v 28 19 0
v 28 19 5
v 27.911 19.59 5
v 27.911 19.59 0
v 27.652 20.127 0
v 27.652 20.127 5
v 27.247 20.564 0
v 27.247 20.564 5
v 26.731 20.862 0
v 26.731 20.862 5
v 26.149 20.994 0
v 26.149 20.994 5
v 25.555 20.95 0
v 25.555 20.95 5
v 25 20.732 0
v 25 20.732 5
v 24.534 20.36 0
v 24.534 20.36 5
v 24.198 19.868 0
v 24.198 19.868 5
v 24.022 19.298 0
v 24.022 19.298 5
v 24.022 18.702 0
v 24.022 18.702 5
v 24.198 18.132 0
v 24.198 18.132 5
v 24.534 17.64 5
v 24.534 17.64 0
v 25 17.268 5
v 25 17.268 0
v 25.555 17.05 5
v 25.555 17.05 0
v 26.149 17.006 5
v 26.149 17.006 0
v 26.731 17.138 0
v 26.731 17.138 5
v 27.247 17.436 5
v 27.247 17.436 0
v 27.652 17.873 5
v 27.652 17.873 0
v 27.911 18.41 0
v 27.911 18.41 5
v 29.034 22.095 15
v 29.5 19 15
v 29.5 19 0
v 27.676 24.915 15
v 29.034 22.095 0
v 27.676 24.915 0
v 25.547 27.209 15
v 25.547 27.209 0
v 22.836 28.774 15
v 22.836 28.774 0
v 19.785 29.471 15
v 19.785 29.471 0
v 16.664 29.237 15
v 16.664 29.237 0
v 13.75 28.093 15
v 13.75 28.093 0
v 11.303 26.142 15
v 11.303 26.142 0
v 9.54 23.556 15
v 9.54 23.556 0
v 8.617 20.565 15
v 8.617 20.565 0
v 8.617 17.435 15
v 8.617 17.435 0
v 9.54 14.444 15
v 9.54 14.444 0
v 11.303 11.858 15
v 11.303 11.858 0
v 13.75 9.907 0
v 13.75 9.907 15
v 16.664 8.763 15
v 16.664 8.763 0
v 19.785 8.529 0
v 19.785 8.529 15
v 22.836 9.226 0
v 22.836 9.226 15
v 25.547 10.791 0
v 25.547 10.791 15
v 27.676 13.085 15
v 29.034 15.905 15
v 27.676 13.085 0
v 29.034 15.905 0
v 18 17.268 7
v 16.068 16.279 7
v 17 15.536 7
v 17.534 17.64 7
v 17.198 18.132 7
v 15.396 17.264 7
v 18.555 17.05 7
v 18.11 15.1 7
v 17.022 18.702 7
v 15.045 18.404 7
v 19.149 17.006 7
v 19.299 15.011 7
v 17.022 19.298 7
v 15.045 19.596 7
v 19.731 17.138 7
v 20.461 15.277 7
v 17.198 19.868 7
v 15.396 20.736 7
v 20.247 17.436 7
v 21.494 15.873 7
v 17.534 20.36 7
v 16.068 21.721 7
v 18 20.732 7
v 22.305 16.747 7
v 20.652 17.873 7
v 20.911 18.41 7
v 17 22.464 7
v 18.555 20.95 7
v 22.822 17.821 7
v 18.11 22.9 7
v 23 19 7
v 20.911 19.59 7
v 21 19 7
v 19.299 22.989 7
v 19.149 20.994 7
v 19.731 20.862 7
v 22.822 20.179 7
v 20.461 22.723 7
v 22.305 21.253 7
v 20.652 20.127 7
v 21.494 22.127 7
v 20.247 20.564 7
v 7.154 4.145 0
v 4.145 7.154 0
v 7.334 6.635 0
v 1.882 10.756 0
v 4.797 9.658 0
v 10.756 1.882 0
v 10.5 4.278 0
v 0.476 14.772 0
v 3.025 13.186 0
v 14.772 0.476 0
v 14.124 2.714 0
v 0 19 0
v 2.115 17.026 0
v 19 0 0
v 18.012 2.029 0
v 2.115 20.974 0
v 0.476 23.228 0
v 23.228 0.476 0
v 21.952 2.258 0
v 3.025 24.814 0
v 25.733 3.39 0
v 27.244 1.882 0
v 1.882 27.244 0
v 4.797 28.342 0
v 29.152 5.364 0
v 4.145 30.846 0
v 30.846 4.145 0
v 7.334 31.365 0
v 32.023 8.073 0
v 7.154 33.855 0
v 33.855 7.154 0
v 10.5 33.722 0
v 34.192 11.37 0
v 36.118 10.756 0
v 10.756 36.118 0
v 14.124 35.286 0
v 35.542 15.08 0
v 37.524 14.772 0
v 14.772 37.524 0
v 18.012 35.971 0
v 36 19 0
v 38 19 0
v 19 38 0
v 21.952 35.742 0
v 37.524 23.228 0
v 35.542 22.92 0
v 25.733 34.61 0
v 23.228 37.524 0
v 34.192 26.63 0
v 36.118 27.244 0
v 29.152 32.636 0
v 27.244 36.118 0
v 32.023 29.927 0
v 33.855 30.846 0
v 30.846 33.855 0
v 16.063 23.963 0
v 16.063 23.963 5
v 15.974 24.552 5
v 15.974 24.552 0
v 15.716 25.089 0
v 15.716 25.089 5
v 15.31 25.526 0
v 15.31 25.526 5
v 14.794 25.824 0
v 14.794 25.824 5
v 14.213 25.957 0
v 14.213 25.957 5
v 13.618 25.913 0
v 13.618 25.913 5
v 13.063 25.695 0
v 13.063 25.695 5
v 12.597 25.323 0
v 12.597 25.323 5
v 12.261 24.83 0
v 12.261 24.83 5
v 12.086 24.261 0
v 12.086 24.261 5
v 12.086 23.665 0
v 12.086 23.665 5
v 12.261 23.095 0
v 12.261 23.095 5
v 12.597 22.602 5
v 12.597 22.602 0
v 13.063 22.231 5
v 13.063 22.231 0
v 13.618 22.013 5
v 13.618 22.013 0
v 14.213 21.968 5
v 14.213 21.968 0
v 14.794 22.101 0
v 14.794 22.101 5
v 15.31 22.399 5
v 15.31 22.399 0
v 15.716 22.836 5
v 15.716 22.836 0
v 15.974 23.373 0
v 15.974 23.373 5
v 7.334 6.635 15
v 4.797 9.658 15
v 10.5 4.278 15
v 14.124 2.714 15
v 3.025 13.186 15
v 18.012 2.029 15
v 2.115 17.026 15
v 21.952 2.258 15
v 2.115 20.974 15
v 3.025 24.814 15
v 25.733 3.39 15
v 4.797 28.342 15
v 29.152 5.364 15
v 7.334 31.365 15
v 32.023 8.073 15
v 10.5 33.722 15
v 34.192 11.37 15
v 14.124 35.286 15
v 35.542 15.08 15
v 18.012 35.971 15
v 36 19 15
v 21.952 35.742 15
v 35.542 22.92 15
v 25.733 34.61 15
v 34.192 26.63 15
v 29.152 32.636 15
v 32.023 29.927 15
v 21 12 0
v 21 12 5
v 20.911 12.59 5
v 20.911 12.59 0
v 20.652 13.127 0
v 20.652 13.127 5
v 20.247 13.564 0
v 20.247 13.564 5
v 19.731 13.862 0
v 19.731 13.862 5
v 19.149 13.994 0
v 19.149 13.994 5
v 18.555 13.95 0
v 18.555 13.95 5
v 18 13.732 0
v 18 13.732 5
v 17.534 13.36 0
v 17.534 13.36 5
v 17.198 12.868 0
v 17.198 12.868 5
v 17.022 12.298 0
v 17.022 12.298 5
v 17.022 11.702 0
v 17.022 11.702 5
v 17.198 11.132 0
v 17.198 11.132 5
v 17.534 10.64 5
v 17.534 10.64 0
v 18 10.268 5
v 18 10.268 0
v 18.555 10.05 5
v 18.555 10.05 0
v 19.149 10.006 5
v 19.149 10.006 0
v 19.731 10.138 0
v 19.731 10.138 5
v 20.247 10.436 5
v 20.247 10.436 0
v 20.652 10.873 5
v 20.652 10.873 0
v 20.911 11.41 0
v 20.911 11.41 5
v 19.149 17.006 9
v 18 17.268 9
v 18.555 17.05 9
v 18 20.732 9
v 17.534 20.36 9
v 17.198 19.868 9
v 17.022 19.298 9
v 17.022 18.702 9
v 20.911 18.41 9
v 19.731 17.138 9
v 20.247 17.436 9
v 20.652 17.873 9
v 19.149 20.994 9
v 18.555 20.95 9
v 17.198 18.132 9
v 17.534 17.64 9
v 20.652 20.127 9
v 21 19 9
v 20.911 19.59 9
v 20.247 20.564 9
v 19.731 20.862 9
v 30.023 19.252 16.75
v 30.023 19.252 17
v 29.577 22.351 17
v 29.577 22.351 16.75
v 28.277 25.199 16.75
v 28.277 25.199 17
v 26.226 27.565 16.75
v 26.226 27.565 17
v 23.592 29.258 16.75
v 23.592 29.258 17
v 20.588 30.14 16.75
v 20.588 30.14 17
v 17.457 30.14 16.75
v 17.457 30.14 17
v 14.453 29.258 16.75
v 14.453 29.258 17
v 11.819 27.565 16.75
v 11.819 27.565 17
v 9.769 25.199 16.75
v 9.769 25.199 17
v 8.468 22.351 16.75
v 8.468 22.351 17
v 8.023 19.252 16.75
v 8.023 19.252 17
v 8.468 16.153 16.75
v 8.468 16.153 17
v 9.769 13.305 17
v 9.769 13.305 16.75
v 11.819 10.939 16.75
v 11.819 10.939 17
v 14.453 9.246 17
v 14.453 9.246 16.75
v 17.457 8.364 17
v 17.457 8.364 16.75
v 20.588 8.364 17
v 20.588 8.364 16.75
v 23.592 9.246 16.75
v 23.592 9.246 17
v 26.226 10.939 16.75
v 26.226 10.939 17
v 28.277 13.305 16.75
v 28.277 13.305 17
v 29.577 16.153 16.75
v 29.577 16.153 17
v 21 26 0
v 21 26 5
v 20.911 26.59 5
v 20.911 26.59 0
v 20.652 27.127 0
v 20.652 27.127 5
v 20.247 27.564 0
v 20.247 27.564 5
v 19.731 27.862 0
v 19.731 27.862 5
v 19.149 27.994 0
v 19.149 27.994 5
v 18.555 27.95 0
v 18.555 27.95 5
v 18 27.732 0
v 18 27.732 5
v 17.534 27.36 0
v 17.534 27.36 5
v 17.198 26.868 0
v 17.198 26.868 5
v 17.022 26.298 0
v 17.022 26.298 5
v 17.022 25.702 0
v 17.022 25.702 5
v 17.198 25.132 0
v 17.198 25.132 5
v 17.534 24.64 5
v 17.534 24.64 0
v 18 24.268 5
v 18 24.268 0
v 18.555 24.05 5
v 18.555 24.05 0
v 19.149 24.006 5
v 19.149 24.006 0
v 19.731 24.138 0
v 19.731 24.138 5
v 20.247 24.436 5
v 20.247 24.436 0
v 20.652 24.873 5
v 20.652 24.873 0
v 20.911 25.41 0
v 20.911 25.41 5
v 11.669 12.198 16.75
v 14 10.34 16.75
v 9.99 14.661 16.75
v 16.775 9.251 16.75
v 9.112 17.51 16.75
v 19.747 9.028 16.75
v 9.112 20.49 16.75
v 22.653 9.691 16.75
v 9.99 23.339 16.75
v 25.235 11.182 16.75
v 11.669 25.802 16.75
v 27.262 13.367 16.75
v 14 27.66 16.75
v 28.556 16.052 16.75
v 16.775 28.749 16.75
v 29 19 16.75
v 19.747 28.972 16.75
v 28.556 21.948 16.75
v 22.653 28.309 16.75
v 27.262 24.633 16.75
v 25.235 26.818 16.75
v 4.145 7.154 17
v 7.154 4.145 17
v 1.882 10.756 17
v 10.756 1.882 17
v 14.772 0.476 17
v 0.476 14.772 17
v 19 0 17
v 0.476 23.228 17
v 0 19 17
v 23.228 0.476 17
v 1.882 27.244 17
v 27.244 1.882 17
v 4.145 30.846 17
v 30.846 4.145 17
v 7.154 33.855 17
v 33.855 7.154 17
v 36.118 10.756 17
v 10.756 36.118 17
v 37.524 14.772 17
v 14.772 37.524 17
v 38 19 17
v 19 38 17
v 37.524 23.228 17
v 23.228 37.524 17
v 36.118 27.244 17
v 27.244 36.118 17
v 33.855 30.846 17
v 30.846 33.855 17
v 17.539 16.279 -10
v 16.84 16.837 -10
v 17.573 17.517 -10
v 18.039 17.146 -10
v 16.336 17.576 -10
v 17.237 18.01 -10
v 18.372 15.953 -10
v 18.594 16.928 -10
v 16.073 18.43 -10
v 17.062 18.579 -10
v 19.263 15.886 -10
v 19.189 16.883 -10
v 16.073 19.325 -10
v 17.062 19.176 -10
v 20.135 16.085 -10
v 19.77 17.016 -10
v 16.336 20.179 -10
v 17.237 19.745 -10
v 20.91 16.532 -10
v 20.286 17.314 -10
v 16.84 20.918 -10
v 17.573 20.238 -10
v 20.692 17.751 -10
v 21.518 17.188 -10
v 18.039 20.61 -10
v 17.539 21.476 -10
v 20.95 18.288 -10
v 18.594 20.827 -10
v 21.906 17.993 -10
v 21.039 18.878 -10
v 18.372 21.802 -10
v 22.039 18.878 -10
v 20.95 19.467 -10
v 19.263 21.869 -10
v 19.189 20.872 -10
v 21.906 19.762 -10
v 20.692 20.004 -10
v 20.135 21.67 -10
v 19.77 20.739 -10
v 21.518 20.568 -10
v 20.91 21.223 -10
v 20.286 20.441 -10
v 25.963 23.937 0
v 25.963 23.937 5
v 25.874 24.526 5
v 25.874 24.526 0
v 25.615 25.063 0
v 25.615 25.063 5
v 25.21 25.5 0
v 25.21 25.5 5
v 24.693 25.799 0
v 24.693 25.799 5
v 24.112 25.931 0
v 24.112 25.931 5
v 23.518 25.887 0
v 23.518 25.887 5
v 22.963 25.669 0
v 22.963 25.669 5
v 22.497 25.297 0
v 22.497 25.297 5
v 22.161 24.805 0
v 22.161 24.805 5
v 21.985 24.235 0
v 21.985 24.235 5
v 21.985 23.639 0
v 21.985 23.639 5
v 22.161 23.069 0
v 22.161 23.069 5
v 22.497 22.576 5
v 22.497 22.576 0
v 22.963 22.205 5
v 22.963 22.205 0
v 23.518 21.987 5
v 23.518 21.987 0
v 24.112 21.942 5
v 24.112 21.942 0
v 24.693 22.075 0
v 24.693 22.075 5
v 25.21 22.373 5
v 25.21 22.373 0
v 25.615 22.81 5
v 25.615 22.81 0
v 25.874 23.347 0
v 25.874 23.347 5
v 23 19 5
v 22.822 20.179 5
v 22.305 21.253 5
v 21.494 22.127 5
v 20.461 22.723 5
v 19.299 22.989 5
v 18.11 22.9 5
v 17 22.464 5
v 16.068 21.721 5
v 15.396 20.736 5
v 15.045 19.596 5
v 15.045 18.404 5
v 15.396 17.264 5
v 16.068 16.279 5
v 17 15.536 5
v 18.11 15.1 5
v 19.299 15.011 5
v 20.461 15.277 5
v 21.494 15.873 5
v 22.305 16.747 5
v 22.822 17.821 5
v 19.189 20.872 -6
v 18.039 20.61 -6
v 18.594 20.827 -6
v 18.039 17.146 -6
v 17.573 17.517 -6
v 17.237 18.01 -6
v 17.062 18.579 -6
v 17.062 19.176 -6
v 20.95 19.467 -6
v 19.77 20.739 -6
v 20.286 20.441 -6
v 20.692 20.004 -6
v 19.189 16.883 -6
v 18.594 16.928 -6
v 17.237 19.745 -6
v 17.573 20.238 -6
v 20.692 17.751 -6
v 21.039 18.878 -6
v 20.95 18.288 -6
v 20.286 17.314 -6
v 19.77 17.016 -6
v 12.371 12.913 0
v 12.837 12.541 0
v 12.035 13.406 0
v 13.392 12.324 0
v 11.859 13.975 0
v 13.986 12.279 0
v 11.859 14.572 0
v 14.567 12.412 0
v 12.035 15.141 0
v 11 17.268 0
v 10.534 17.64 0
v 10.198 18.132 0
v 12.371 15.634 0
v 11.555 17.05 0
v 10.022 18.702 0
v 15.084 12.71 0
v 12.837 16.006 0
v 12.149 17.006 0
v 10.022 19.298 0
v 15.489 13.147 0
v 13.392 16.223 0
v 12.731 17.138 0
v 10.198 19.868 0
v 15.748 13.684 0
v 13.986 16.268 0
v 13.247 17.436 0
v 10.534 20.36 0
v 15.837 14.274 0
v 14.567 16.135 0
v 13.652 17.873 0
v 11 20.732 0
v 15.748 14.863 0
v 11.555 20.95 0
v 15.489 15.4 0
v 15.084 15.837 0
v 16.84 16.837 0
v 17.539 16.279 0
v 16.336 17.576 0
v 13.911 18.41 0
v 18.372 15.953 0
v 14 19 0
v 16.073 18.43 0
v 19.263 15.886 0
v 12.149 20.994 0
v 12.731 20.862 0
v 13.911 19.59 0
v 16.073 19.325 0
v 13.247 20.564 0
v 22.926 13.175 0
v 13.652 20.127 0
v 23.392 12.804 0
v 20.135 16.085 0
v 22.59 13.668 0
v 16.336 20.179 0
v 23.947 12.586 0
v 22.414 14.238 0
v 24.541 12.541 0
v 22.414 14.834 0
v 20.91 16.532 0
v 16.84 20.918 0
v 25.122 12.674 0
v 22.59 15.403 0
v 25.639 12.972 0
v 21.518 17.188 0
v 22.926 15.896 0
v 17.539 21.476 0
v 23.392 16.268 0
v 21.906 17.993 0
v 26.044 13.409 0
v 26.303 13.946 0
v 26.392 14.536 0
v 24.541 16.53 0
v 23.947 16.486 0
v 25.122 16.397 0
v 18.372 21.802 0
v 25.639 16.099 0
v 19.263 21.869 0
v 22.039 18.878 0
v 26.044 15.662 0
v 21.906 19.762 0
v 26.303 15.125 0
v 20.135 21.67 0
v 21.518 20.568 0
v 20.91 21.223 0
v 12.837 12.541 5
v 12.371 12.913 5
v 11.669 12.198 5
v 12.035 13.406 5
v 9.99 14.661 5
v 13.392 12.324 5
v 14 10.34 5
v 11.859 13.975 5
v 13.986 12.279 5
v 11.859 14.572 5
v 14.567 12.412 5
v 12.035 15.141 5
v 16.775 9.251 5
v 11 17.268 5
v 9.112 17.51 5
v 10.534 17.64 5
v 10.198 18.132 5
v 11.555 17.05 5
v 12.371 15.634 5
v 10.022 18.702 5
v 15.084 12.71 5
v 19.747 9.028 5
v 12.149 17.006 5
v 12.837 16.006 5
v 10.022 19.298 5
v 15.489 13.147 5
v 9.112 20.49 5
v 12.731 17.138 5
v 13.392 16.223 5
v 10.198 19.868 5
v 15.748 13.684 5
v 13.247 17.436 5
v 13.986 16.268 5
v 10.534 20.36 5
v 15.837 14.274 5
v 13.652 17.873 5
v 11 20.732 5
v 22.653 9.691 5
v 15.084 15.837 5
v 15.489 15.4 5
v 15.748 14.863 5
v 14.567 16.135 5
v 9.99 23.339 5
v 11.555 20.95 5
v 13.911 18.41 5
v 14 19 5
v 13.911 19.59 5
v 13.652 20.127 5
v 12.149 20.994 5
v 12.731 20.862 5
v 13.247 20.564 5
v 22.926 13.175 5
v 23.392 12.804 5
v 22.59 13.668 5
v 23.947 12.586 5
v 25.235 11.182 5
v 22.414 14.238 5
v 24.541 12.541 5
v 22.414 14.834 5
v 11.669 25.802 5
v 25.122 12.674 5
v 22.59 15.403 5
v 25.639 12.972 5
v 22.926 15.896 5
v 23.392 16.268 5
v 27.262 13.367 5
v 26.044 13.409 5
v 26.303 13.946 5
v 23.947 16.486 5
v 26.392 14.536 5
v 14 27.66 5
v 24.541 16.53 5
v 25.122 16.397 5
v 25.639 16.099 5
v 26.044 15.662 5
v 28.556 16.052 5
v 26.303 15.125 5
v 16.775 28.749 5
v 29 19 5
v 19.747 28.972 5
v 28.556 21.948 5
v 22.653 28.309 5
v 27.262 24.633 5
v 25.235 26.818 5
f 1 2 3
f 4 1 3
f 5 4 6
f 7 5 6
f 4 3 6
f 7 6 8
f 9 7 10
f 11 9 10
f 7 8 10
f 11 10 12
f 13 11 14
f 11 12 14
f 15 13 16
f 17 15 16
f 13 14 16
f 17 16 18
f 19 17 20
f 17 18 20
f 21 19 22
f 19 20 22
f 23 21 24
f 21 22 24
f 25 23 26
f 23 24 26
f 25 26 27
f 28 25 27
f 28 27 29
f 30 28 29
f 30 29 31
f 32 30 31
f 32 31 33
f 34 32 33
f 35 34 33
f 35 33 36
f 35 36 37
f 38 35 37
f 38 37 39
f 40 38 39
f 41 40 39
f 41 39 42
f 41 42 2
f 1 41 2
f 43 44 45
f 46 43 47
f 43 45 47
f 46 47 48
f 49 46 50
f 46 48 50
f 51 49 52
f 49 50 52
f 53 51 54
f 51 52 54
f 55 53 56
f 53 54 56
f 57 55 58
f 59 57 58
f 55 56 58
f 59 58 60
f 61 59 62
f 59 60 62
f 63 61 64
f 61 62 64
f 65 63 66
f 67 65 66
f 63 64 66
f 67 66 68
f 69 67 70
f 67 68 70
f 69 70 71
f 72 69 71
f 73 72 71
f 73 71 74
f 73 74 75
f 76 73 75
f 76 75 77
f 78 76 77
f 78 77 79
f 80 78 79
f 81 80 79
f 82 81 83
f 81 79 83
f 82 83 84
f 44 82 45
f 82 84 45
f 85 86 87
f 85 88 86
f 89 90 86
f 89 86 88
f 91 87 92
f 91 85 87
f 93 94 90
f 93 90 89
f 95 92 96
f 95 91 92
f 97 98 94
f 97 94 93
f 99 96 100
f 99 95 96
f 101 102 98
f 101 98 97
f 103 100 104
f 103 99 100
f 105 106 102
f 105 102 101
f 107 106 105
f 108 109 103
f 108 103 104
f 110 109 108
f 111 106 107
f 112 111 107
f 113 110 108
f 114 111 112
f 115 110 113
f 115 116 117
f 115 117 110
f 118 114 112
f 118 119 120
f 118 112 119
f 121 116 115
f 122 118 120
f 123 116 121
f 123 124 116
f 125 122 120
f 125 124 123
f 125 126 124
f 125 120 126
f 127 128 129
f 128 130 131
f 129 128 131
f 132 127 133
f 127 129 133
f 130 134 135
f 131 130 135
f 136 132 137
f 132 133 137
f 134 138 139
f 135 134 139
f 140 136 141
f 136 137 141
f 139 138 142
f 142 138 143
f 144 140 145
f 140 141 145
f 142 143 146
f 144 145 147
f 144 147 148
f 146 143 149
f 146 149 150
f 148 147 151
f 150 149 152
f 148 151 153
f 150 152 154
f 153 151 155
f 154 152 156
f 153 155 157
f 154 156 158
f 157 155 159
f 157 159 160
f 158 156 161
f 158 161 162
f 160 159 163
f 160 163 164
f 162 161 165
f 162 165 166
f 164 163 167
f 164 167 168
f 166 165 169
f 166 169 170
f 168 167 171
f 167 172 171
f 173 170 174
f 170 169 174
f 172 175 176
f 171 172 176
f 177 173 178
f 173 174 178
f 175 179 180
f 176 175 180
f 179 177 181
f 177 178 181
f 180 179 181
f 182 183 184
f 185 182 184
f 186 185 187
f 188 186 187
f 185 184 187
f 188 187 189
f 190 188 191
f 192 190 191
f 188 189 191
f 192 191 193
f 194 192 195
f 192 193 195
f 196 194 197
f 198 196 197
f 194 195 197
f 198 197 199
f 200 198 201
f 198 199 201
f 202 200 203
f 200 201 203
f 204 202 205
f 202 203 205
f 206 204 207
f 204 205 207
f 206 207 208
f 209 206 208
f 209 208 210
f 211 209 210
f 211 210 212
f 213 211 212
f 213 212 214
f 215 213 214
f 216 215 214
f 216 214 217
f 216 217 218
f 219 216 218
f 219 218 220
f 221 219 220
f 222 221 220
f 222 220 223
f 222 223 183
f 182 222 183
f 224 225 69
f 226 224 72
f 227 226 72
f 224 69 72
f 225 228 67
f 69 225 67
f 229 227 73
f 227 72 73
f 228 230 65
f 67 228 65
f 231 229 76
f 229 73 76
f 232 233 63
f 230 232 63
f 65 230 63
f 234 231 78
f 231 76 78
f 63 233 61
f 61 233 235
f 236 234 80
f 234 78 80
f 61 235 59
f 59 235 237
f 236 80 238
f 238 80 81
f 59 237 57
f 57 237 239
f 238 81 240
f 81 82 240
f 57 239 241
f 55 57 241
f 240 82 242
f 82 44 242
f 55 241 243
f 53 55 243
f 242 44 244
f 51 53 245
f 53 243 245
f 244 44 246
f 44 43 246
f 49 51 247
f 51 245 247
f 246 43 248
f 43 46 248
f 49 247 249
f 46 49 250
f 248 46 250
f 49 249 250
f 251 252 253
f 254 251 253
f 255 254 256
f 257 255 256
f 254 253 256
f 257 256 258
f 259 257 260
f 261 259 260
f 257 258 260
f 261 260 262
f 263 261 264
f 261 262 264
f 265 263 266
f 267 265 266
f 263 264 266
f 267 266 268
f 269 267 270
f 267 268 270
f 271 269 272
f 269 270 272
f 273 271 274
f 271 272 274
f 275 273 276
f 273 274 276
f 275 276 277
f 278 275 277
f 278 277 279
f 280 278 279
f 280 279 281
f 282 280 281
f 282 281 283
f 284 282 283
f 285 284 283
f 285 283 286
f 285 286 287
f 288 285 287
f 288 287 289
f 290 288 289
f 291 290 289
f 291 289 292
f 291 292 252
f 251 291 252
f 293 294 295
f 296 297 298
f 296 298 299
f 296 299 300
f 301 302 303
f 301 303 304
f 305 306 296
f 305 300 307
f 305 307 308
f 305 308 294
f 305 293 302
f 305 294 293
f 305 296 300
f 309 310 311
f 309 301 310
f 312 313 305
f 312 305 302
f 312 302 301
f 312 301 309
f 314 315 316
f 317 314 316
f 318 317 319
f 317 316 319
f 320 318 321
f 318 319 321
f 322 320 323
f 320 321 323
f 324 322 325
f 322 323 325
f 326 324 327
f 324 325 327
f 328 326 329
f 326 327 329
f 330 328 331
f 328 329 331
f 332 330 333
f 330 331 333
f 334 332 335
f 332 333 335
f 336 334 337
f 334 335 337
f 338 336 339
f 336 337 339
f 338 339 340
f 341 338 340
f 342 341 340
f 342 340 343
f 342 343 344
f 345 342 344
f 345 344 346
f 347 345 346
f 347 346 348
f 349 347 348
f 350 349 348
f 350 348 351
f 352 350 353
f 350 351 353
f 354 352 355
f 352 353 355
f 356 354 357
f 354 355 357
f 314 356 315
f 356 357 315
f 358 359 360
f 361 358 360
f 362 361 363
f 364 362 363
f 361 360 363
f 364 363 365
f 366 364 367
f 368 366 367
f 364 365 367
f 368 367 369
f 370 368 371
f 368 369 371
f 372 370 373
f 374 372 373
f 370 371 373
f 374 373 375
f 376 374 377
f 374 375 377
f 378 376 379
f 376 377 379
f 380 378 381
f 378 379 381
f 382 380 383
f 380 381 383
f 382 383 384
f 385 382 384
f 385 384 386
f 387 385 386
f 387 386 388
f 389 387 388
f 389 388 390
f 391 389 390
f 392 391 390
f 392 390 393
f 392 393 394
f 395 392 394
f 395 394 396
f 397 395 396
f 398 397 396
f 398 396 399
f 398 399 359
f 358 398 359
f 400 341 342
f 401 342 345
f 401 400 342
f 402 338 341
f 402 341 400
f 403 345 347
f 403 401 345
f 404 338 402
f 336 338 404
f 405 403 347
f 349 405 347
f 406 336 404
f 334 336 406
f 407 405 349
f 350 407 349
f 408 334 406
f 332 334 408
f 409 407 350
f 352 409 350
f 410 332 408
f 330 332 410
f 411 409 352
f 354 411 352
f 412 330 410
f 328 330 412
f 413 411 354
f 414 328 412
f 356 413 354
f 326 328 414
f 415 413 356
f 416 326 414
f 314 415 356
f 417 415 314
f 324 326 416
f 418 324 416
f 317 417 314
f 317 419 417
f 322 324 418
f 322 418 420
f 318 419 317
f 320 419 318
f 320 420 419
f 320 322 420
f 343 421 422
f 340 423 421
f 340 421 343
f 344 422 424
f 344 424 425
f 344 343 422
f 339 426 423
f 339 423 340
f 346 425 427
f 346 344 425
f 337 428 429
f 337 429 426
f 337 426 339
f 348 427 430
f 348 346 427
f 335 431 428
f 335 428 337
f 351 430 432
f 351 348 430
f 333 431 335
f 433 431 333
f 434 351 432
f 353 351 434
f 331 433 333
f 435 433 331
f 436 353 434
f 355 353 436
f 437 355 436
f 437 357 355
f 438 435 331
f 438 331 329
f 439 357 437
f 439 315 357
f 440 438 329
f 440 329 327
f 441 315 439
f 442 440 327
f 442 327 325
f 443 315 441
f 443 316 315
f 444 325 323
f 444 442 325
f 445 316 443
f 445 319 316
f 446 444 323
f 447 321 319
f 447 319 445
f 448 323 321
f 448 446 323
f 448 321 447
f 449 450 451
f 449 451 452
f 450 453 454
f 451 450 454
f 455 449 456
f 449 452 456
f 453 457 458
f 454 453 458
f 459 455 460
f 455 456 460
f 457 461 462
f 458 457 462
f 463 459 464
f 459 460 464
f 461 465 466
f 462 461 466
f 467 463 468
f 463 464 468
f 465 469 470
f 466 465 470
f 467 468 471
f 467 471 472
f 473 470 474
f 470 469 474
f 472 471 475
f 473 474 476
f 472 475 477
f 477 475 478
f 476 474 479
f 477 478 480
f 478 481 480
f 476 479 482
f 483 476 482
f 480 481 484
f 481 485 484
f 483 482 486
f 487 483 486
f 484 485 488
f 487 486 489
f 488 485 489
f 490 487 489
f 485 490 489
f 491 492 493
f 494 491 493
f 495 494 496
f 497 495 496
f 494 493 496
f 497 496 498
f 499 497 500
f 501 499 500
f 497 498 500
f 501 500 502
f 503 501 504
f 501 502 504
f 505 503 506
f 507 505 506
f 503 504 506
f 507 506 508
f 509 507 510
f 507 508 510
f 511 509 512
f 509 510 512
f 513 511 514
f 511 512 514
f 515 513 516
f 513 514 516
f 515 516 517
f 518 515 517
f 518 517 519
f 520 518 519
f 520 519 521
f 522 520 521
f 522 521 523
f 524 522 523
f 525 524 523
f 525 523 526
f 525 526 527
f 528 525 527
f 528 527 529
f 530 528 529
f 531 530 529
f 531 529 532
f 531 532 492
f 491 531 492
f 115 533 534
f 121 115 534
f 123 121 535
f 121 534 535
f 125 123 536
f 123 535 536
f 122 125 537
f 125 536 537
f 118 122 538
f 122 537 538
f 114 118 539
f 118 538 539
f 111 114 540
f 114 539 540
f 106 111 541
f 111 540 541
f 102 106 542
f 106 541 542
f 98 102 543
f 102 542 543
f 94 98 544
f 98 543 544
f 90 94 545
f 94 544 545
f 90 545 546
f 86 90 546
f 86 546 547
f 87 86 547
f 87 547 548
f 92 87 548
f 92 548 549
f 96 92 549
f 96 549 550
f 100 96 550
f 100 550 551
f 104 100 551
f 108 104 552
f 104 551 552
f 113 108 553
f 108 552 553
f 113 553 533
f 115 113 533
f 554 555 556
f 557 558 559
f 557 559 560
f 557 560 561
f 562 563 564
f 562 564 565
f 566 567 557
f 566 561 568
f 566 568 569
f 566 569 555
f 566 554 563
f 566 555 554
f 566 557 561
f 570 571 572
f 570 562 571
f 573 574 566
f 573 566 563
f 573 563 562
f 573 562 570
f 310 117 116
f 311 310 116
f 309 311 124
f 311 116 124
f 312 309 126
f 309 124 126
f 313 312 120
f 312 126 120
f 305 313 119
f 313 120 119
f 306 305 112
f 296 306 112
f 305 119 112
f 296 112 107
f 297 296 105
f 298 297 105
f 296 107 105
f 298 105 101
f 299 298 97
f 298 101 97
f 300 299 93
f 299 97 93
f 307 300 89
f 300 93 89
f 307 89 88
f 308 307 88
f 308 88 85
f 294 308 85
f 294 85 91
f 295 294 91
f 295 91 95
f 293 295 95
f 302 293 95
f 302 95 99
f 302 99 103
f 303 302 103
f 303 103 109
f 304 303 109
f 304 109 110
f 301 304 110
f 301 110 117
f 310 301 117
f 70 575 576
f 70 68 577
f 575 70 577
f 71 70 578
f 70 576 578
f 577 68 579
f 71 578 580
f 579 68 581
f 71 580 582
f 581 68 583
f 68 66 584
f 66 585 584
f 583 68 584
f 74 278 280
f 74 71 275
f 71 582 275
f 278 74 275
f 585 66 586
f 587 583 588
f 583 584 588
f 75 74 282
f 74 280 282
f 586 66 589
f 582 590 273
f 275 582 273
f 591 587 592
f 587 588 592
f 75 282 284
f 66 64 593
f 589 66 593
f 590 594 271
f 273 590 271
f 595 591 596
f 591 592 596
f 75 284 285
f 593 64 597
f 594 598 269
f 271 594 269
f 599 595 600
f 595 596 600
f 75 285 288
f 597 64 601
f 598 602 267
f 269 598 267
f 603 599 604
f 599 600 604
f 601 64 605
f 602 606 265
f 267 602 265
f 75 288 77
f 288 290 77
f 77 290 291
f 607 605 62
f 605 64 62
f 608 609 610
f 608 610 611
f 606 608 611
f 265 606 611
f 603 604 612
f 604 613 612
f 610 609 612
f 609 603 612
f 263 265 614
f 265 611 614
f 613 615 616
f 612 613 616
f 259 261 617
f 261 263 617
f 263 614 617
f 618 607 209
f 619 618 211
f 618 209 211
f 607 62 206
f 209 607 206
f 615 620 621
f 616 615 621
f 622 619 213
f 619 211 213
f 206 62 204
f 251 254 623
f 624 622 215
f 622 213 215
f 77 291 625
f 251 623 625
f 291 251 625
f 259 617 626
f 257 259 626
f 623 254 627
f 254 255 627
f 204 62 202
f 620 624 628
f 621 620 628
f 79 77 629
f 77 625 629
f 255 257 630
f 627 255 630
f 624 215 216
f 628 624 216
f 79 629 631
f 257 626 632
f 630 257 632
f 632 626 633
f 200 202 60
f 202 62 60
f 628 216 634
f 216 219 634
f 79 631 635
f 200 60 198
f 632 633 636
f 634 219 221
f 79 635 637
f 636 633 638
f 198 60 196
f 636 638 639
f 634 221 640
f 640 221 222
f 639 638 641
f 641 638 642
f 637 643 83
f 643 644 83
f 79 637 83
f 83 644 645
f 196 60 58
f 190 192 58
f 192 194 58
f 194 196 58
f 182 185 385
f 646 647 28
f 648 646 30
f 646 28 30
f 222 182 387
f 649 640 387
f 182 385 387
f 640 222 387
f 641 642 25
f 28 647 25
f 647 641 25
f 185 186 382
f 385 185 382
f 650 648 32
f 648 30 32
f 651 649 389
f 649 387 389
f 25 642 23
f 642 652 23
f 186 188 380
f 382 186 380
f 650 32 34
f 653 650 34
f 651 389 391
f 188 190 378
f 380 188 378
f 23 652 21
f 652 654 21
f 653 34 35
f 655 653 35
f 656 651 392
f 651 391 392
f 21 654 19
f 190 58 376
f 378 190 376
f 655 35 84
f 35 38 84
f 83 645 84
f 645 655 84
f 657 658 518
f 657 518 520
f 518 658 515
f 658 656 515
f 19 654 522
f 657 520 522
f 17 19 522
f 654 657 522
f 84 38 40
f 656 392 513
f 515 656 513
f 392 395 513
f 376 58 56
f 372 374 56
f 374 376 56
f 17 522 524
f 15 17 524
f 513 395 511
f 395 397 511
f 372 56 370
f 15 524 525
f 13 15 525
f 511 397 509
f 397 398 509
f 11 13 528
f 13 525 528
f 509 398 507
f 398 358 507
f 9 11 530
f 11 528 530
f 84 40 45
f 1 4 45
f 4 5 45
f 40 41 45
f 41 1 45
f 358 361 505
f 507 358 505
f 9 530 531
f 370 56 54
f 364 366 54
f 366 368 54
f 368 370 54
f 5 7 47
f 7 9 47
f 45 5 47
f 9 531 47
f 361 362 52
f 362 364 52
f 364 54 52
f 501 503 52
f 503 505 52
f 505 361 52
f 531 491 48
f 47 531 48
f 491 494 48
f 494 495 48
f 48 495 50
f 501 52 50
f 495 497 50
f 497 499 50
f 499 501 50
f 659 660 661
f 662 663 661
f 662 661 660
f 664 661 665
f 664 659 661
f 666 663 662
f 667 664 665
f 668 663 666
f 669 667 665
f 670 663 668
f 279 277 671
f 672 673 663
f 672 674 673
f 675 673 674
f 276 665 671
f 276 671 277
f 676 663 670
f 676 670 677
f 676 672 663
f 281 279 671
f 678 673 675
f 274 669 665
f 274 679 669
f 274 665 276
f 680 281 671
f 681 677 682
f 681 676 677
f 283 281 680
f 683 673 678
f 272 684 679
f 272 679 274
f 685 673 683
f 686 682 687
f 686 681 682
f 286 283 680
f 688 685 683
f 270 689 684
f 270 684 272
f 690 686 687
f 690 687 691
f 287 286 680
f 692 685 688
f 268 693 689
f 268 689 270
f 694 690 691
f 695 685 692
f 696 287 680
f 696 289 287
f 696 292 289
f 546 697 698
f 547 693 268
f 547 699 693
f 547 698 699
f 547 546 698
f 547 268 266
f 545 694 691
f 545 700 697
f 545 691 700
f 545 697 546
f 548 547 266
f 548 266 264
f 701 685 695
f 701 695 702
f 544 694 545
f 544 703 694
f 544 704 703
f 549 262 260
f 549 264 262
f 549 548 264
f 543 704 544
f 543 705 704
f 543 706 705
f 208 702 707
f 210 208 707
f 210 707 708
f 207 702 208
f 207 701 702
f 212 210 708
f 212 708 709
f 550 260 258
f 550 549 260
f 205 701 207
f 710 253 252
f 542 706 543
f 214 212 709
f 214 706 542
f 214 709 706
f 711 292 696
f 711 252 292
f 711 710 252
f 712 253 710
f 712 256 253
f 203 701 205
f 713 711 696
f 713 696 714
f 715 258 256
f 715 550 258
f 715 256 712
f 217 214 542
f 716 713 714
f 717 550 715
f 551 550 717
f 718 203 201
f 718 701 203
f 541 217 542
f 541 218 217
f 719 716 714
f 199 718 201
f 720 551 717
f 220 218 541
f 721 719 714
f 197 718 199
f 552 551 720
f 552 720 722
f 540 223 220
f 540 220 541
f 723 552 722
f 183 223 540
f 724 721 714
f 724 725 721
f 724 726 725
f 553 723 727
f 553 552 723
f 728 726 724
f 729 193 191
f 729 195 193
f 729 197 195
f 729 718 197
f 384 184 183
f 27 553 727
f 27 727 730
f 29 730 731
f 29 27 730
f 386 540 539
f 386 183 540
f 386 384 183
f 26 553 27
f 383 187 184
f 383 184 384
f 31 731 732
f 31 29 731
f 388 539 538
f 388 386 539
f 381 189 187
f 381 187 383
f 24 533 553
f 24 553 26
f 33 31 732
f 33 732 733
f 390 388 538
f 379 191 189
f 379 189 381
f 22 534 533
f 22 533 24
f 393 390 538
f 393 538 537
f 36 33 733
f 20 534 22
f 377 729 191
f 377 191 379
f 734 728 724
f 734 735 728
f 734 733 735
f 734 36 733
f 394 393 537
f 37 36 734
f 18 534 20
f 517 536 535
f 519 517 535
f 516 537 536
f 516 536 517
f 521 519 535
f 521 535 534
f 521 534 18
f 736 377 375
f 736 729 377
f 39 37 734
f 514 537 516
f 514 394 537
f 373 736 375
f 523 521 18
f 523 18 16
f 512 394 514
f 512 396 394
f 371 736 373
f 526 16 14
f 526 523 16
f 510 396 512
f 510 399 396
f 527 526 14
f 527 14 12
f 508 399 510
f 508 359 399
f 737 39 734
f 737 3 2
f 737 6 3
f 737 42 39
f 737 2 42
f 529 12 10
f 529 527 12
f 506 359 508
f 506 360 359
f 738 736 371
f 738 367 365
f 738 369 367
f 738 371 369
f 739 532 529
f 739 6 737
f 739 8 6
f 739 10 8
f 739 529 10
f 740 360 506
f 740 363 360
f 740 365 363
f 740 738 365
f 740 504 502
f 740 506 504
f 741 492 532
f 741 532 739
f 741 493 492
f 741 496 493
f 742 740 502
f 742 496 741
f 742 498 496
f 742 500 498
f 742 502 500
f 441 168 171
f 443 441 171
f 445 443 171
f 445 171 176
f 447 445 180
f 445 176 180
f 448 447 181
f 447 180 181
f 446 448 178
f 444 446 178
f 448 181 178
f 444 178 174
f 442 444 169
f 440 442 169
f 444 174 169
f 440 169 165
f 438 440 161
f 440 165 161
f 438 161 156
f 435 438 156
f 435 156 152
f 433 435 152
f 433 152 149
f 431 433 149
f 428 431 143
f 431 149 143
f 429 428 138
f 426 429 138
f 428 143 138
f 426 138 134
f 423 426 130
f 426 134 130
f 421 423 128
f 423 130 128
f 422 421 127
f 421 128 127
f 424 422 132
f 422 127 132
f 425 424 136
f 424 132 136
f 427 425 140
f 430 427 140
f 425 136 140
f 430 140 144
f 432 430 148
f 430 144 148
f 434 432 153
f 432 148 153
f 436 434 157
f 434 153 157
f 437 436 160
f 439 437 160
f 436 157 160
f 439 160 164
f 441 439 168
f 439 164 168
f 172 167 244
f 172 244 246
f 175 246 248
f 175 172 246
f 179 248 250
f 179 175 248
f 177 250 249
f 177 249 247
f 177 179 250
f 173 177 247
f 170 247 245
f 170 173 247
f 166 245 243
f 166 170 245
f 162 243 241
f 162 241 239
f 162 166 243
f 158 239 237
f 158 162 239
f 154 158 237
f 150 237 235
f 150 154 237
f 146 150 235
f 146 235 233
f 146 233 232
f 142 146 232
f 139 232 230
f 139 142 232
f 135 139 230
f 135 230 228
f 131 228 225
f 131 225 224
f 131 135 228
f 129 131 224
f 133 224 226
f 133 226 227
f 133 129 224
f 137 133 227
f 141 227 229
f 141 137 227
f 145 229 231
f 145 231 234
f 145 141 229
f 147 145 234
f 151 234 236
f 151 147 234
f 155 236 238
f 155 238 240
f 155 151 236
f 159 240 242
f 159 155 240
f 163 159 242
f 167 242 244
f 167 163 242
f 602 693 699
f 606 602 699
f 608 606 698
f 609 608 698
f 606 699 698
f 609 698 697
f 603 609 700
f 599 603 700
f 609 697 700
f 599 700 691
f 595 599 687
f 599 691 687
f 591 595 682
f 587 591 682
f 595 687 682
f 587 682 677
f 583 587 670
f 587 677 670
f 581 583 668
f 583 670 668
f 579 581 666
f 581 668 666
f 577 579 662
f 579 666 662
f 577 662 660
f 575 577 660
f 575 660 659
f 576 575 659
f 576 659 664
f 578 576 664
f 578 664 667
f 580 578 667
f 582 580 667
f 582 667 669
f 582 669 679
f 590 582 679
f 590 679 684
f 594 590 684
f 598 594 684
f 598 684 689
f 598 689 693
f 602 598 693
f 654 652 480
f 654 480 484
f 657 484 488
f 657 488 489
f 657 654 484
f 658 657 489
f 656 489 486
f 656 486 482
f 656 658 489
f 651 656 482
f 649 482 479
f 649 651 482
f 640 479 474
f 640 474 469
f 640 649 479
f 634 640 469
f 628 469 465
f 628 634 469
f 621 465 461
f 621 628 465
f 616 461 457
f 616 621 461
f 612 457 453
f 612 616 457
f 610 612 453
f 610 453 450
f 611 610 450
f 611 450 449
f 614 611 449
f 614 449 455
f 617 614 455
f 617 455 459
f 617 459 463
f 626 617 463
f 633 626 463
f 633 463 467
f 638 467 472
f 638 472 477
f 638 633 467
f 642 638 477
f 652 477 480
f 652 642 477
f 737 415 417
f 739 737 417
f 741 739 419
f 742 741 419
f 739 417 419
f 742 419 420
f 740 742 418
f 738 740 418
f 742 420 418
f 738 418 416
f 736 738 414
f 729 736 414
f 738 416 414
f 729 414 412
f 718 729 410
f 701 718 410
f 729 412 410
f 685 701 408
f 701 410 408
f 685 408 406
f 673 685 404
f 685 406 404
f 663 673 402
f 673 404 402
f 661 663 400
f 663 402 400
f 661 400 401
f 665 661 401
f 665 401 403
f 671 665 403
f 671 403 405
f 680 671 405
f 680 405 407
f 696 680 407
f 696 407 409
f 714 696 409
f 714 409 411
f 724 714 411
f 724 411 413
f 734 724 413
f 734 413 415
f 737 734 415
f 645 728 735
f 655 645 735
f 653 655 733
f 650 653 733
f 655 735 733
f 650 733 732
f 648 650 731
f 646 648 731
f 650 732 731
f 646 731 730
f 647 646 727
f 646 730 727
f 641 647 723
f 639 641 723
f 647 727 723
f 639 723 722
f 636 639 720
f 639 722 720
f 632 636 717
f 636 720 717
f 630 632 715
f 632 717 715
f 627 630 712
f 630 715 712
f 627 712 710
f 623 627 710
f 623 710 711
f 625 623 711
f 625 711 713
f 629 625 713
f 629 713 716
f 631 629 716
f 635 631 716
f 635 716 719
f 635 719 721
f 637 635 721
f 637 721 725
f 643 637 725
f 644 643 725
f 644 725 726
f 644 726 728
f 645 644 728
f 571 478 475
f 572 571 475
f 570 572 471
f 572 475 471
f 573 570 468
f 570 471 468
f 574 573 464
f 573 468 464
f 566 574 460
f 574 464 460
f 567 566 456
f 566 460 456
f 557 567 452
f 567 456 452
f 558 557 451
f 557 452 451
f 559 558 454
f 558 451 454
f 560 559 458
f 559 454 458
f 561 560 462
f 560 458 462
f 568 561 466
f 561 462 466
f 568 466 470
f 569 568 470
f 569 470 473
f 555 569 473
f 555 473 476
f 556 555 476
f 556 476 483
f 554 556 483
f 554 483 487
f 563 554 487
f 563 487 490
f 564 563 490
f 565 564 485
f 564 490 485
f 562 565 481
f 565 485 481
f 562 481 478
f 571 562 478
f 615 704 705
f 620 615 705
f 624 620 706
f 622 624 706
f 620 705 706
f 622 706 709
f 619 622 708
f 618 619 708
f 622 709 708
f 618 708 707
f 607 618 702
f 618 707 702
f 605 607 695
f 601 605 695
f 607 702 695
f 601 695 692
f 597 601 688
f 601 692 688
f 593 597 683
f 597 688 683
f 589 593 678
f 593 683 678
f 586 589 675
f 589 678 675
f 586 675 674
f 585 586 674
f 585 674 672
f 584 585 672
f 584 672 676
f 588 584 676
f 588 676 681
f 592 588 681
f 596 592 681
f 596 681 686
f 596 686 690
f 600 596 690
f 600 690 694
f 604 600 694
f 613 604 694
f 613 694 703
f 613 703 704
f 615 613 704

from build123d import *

# Parameters (mm, degrees)
F0_R      = 19
F1_DEPTH  = 17
F2_R      = 17
F2_R_2    = 10.5
F3_DEPTH  = 15
F4_R      = 3
F5_DEPTH  = 10
F6_R      = 10
F7_DEPTH  = 12
F8_R      = 2
F9_DEPTH  = 25
F10_DEPTH = 4
F8_R_2    = 4
F11_DEPTH = 2
F12_R     = 11
F13_DEPTH = 0.25
F14_R     = 2
F15_DEPTH = 4


with BuildPart() as f1:
    # F0 (on Top) → F1 (new body)
    with BuildSketch(Plane.XY):
        with Locations((19, 19)):
            Circle(F0_R)
    extrude(amount=F1_DEPTH)

    # F2 (on Top) → F3 (cut)
    with BuildSketch(Plane.XY):
        with Locations((19, 19)):
            Circle(F2_R)
        with Locations((19, 19)):
            Circle(F2_R_2, mode=Mode.SUBTRACT)
    extrude(amount=F3_DEPTH, mode=Mode.SUBTRACT)

    # F4 (on face) → F5 (join)
    with BuildSketch(Plane.XY):
        with Locations((19.039284, 18.877556)):
            Circle(F4_R)
    extrude(amount=-F5_DEPTH)

    # F6 (on face) → F7 (cut)
    with BuildSketch(Plane.XY.offset(17)):
        with Locations((19, 19)):
            Circle(F6_R)
    extrude(amount=-F7_DEPTH, mode=Mode.SUBTRACT)

    # F8 (on face) → F9 (cut)
    with BuildSketch(Plane.XY.offset(5)):
        with Locations((19, 26)):
            Circle(F8_R)
        with Locations((23.962697, 23.936764)):
            Circle(F8_R)
        with Locations((26, 19)):
            Circle(F8_R)
        with Locations((24.39163, 14.535661)):
            Circle(F8_R)
        with Locations((19, 12)):
            Circle(F8_R)
        with Locations((13.836625, 14.273526)):
            Circle(F8_R)
        with Locations((12, 19)):
            Circle(F8_R)
        with Locations((14.063236, 23.962697)):
            Circle(F8_R)
    extrude(amount=-F9_DEPTH, mode=Mode.SUBTRACT)

    # F8 (on face) → F10 (join)
    with BuildSketch(Plane.XY.offset(5)):
        with Locations((19, 19)):
            Circle(F8_R)
    extrude(amount=F10_DEPTH)

    # F8 (on face) → F11 (join)
    with BuildSketch(Plane.XY.offset(5)):
        with Locations((19, 19)):
            Circle(F8_R_2)
        with Locations((19, 19)):
            Circle(F8_R, mode=Mode.SUBTRACT)
    extrude(amount=F11_DEPTH)

    # F12 (on face) → F13 (cut)
    with BuildSketch(Plane.XY.offset(17)):
        with Locations((19.02286, 19.252149)):
            Circle(F12_R)
    extrude(amount=-F13_DEPTH, mode=Mode.SUBTRACT)

    # F14 (on face) → F15 (cut)
    with BuildSketch(Plane(origin=(0, 0, -10), x_dir=(1, 0, 0), z_dir=(0, 0, -1))):
        with Locations((19.039284, -18.877556)):
            Circle(F14_R)
    extrude(amount=-F15_DEPTH, mode=Mode.SUBTRACT)


solid = f1.part
